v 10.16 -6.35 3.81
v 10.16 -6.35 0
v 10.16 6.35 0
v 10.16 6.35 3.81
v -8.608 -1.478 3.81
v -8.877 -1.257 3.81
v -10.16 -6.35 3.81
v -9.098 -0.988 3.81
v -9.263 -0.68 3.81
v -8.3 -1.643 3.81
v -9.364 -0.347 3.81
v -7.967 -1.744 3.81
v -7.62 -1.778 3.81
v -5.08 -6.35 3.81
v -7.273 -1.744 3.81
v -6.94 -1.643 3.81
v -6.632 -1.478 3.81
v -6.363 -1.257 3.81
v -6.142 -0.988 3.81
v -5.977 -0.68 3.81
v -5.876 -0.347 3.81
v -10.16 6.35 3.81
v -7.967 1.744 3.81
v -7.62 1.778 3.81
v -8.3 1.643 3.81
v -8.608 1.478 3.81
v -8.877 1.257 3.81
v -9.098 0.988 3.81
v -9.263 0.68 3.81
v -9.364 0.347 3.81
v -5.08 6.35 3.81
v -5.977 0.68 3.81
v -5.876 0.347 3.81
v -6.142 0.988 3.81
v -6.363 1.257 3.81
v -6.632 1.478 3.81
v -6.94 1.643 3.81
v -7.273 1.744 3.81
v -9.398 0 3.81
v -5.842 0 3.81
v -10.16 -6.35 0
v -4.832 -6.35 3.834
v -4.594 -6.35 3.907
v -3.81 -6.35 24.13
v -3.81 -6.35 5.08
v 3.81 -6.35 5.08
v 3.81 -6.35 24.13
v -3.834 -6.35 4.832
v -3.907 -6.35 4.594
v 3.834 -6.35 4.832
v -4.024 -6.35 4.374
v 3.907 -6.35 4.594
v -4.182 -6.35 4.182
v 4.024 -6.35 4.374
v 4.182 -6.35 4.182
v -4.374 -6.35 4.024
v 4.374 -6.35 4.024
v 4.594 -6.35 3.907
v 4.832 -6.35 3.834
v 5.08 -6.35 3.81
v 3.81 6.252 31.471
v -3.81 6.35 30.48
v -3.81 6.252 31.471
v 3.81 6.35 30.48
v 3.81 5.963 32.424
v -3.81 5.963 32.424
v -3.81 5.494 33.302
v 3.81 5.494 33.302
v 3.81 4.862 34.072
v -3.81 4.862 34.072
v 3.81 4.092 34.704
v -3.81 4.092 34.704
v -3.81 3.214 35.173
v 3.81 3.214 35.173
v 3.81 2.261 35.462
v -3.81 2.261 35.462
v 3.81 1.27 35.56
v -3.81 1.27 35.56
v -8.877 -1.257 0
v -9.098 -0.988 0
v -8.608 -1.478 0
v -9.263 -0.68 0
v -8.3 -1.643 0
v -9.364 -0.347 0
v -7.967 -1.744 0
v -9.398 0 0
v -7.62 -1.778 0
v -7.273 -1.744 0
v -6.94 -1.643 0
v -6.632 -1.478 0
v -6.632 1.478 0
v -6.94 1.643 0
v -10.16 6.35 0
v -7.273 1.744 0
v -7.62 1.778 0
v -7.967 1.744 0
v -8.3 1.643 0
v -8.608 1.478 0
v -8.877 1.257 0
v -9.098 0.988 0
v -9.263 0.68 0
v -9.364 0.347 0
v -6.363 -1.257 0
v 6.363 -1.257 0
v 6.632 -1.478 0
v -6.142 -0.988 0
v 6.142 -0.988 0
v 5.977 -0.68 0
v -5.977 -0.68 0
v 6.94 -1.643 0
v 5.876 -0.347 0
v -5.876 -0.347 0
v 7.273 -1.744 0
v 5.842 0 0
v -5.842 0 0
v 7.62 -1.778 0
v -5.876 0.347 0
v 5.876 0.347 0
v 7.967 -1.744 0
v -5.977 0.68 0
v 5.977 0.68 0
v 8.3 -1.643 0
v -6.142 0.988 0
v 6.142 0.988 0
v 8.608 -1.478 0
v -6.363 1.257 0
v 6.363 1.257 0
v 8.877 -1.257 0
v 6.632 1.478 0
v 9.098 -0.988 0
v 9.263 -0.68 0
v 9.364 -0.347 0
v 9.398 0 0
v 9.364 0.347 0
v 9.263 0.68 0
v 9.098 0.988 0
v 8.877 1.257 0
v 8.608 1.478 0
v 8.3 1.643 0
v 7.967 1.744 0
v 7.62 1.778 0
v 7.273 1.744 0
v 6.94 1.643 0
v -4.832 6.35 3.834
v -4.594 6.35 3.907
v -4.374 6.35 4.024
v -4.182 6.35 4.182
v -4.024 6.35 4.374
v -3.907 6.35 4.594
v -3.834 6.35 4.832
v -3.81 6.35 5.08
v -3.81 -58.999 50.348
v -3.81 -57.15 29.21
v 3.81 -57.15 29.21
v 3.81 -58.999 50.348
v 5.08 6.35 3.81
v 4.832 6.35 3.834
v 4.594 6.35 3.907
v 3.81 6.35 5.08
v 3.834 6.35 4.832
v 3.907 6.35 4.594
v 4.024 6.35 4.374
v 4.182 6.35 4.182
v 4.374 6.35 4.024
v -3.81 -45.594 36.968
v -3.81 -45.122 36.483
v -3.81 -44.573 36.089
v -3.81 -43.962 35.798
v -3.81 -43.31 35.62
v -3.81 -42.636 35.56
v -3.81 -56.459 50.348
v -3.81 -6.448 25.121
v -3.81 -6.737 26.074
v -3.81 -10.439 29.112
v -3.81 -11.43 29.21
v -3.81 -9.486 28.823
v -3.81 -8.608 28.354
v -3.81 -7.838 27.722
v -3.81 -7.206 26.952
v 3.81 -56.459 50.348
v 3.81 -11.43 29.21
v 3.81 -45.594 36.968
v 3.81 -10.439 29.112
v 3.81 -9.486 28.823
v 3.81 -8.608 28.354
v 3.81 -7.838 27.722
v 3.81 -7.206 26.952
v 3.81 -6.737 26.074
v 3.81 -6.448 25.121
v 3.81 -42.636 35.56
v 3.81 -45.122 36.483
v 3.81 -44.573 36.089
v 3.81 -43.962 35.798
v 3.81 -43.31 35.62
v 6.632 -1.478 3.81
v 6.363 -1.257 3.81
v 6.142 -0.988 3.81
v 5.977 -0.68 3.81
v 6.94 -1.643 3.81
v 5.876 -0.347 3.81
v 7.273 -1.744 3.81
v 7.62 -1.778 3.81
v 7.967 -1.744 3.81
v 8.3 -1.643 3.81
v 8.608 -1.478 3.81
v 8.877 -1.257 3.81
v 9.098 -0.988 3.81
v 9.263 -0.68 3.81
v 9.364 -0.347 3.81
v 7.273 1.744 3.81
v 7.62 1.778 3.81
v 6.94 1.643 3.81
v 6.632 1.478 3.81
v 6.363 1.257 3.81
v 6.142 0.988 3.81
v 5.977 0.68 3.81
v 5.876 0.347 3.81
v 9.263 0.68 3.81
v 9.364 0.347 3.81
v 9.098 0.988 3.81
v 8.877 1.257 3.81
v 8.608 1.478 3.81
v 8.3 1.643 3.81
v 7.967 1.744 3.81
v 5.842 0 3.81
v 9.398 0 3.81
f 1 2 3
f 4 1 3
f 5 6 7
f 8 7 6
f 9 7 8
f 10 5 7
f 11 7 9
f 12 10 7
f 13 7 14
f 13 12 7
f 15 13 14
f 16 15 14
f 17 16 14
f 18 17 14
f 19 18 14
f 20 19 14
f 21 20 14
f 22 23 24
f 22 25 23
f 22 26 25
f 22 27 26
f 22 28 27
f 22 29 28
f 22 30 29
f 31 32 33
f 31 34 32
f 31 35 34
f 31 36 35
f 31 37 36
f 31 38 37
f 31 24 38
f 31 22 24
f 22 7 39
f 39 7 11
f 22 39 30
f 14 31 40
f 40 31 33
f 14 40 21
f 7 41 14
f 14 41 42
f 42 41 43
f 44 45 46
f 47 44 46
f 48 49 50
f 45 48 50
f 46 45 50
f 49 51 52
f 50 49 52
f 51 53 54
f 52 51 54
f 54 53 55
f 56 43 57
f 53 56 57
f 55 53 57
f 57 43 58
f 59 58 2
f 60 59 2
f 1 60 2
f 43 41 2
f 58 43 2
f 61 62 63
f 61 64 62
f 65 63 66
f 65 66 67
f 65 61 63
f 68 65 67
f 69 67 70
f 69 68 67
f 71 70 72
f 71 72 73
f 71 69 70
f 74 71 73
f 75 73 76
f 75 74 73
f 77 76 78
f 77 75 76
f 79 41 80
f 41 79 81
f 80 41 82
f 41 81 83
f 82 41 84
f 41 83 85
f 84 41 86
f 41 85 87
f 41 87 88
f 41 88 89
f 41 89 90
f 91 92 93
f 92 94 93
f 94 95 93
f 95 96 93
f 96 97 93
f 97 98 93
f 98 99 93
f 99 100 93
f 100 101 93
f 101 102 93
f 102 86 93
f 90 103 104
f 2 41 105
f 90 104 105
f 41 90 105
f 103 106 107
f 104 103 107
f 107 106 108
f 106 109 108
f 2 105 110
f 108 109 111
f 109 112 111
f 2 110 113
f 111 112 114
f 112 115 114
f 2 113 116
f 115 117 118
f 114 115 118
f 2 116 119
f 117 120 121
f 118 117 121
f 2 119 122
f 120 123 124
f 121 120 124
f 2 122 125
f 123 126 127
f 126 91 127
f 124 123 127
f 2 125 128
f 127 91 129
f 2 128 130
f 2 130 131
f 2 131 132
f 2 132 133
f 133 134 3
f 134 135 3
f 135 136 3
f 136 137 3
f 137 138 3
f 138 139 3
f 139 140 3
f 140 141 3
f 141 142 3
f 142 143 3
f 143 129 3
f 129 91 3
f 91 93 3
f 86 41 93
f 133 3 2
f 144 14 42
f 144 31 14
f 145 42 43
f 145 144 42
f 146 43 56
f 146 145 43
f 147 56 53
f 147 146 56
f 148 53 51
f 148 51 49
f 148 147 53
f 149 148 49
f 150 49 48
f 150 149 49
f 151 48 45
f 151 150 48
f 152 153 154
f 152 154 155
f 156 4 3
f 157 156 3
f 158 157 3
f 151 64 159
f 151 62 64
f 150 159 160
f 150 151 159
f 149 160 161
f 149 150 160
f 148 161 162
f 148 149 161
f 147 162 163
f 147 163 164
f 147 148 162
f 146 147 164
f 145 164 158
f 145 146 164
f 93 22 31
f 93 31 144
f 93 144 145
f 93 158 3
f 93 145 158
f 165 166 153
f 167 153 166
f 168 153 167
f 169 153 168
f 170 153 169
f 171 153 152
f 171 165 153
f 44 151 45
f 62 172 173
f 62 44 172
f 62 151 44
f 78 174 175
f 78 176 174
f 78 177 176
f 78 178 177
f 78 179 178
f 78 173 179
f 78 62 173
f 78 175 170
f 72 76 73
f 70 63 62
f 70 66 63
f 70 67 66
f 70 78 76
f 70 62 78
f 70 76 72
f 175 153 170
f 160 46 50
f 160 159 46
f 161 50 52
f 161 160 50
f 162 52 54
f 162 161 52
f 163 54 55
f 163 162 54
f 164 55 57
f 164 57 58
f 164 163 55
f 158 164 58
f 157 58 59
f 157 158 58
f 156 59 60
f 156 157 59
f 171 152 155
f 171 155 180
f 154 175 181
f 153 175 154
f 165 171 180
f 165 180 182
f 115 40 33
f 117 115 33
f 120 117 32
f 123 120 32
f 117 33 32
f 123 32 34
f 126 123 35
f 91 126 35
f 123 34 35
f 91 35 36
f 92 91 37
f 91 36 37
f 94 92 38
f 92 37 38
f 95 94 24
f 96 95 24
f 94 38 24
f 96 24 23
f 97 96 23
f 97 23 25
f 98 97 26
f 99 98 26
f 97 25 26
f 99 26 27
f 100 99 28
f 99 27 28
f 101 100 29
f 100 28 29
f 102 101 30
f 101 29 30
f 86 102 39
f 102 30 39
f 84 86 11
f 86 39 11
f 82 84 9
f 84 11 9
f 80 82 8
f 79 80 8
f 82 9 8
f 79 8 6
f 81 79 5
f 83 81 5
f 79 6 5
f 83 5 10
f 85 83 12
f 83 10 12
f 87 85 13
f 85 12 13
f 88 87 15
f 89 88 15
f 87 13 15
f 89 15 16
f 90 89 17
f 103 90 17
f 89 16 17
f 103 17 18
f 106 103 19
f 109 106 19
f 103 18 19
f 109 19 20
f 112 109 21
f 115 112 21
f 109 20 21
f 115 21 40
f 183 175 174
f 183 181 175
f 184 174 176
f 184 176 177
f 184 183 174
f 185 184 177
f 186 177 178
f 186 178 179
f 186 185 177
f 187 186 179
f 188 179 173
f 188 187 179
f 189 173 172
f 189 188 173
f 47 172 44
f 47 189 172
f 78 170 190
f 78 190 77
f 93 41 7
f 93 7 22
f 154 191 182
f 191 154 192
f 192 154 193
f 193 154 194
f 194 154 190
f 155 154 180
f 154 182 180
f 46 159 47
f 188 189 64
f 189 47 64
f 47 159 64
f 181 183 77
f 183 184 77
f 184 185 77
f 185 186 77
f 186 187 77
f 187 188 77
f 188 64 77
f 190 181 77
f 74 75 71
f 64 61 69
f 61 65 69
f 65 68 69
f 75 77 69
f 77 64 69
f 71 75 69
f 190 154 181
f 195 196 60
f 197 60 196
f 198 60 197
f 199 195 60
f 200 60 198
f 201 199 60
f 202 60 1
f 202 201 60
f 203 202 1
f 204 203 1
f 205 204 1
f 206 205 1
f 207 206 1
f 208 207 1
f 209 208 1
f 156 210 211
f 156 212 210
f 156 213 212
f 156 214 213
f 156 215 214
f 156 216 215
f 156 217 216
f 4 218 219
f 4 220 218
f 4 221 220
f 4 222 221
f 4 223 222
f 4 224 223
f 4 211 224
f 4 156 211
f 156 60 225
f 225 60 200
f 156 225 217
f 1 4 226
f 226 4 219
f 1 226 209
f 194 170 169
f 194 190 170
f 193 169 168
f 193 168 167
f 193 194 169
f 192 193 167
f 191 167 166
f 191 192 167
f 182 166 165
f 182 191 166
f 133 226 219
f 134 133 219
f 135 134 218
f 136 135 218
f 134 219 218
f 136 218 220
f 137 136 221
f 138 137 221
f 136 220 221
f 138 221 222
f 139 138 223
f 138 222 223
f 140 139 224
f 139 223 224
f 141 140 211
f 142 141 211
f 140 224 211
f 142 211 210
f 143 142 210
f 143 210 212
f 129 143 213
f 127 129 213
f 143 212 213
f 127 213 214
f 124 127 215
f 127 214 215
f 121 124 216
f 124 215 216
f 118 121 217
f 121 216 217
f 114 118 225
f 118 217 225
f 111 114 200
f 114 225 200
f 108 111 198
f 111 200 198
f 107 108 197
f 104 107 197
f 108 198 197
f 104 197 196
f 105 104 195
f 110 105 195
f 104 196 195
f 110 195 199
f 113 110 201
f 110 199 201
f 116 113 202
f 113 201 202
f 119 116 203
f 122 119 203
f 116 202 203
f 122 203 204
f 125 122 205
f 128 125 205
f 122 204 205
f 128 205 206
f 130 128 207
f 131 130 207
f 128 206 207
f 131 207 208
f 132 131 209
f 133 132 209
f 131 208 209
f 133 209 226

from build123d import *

# Parameters (mm, degrees)
SKETCH3_W           = 20.32
SKETCH3_H           = 12.7
BOSS_EXTRUDE1_DEPTH = 3.81
SKETCH4_R           = 1.778
CUT_EXTRUDE1_DEPTH  = 3.81
SKETCH5_W           = 7.62
SKETCH5_H           = 12.7
BOSS_EXTRUDE2_DEPTH = 25.4
FILLET1_R           = 1.27
FILLET2_R           = 1.27
BOSS_EXTRUDE6_DEPTH = 7.62
FILLET5_R           = 5.08
FILLET6_R           = 5.08
FILLET7_R           = 3.81


with BuildPart() as part:
    # Sketch3 → Boss-Extrude1 (new body)
    with BuildSketch(Plane.XY):
        Rectangle(SKETCH3_W, SKETCH3_H)
    extrude(amount=BOSS_EXTRUDE1_DEPTH)

    # Sketch4 → Cut-Extrude1 (cut)
    with BuildSketch(Plane.XY.offset(3.81)):
        with Locations((-7.62, 0)):
            Circle(SKETCH4_R)
        with Locations((7.62, 0)):
            Circle(SKETCH4_R)
    extrude(amount=-CUT_EXTRUDE1_DEPTH, mode=Mode.SUBTRACT)

    # Sketch5 → Boss-Extrude2 (add)
    with BuildSketch(Plane.XY.offset(3.81)):
        Rectangle(SKETCH5_W, SKETCH5_H)
    extrude(amount=BOSS_EXTRUDE2_DEPTH)

    # Fillet1
    fillet1_edges = [part.edges().sort_by_distance(p)[0] for p in [
        (-3.81, 0, 3.81),
    ]]
    fillet(fillet1_edges, radius=FILLET1_R)

    # Fillet2
    fillet2_edges = [part.edges().sort_by_distance(p)[0] for p in [
        (3.81, 0, 3.81),
    ]]
    fillet(fillet2_edges, radius=FILLET2_R)

    # Sketch10 → Boss-Extrude6 (add)
    with BuildSketch(Plane.ZY.offset(3.81)):
        Polygon((29.21, 6.35), (29.21, -57.15), (50.347792279, -58.999317196), (50.347792279, -56.459317196), (35.56, -44.45), (35.56, 6.35), align=None)
    extrude(amount=-BOSS_EXTRUDE6_DEPTH)

    # Fillet5
    fillet5_edges = [part.edges().sort_by_distance(p)[0] for p in [
        (0, -6.35, 29.21),
    ]]
    fillet(fillet5_edges, radius=FILLET5_R)

    # Fillet6
    fillet6_edges = [part.edges().sort_by_distance(p)[0] for p in [
        (0, 6.35, 35.56),
    ]]
    fillet(fillet6_edges, radius=FILLET6_R)

    # Fillet7
    fillet7_edges = [part.edges().sort_by_distance(p)[0] for p in [
        (0, -44.45, 35.56),
    ]]
    fillet(fillet7_edges, radius=FILLET7_R)


solid = part.part
